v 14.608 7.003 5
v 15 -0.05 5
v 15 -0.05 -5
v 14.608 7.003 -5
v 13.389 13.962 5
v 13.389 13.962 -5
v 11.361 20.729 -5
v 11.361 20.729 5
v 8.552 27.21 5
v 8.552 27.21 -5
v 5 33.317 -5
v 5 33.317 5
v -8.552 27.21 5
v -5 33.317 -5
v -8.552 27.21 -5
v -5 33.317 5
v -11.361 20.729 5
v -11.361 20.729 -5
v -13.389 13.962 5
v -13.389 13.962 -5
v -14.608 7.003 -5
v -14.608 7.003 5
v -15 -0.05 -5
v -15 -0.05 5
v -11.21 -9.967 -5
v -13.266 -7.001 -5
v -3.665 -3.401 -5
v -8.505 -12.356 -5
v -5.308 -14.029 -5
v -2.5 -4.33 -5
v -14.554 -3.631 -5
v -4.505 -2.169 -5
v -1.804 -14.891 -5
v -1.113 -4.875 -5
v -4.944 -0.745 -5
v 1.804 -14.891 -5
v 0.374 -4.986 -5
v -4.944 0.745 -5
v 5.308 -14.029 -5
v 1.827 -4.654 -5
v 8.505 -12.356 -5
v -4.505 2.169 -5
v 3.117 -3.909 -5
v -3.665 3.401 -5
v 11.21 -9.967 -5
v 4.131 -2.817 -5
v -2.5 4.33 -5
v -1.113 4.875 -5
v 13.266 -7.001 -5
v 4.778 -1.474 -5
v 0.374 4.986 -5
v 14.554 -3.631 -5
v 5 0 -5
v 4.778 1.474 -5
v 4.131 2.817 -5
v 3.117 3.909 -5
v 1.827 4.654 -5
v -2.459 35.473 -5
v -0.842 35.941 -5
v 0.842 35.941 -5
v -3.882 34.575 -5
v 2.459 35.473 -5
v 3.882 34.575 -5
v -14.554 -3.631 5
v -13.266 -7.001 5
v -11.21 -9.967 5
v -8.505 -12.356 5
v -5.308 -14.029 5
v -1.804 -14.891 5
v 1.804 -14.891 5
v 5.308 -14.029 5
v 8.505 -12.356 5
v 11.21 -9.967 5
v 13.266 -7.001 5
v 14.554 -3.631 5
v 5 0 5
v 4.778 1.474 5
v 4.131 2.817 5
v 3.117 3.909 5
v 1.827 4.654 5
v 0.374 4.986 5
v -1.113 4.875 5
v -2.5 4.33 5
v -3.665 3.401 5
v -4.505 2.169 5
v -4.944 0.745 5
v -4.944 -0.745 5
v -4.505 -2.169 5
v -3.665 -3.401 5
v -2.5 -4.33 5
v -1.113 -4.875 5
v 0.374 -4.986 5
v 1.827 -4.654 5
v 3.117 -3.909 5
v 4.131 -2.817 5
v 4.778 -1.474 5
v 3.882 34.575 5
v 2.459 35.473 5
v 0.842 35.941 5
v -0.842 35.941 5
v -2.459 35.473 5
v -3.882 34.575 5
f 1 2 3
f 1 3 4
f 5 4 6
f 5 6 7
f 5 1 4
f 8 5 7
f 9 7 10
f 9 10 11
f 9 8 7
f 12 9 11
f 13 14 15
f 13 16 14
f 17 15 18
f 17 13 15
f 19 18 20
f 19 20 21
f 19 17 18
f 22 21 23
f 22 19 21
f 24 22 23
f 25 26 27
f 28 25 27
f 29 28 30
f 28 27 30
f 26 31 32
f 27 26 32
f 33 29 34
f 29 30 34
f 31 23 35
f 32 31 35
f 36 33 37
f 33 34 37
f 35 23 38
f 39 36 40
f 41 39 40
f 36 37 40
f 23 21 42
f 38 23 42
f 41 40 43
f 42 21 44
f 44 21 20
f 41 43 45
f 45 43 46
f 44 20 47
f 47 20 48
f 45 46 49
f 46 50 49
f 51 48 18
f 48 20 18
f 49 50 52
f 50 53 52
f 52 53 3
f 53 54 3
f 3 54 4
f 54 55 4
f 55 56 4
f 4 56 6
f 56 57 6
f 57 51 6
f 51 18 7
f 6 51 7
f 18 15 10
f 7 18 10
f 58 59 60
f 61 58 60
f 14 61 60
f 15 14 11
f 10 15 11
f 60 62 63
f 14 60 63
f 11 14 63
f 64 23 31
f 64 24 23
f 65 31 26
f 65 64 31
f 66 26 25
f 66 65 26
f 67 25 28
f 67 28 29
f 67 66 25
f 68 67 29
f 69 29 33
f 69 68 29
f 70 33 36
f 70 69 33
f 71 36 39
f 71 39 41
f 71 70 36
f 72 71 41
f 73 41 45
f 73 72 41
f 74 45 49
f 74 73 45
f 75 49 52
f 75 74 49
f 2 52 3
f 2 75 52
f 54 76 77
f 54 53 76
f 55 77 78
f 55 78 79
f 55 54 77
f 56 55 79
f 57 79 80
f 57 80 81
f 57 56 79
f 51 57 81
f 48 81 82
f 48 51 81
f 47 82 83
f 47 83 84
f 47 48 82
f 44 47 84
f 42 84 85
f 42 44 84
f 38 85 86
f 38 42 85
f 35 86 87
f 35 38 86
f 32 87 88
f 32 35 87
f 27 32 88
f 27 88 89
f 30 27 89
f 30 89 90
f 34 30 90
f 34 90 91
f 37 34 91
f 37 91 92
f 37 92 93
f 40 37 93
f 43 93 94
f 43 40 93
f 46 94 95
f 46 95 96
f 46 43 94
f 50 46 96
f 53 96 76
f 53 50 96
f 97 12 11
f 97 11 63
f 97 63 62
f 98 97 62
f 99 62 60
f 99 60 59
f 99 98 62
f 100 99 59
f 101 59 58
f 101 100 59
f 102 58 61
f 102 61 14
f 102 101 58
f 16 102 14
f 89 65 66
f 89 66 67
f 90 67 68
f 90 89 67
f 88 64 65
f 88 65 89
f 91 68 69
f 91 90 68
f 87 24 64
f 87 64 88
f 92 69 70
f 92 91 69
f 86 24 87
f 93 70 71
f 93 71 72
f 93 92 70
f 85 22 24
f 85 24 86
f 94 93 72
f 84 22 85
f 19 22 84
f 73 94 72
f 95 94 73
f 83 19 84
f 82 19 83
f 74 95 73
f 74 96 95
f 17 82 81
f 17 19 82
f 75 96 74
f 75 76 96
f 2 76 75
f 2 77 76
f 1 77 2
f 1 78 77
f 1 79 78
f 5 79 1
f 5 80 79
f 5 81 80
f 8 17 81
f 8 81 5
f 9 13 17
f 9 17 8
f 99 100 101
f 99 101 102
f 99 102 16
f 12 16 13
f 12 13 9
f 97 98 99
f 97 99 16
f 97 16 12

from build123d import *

# Parameters (mm, degrees)
SKETCH1_R           = 5
BOSS_EXTRUDE1_DEPTH = 5


with BuildPart() as part:
    # Sketch1 → Boss-Extrude1 (new, symmetric)
    with BuildSketch(Plane.XY):
        with BuildLine():
            ThreePointArc((-14.999916666, -0.05), (0, -15), (14.999916666, -0.05))
            ThreePointArc((14.999916666, -0.05), (12.474592102, 17.374981858), (4.999972222, 33.316666667))
            ThreePointArc((4.999972222, 33.316666667), (0, 36), (-4.999972222, 33.316666667))
            ThreePointArc((-4.999972222, 33.316666667), (-12.474592102, 17.374981858), (-14.999916666, -0.05))
        make_face()
        Circle(SKETCH1_R, mode=Mode.SUBTRACT)
    extrude(amount=BOSS_EXTRUDE1_DEPTH, both=True)


solid = part.part
